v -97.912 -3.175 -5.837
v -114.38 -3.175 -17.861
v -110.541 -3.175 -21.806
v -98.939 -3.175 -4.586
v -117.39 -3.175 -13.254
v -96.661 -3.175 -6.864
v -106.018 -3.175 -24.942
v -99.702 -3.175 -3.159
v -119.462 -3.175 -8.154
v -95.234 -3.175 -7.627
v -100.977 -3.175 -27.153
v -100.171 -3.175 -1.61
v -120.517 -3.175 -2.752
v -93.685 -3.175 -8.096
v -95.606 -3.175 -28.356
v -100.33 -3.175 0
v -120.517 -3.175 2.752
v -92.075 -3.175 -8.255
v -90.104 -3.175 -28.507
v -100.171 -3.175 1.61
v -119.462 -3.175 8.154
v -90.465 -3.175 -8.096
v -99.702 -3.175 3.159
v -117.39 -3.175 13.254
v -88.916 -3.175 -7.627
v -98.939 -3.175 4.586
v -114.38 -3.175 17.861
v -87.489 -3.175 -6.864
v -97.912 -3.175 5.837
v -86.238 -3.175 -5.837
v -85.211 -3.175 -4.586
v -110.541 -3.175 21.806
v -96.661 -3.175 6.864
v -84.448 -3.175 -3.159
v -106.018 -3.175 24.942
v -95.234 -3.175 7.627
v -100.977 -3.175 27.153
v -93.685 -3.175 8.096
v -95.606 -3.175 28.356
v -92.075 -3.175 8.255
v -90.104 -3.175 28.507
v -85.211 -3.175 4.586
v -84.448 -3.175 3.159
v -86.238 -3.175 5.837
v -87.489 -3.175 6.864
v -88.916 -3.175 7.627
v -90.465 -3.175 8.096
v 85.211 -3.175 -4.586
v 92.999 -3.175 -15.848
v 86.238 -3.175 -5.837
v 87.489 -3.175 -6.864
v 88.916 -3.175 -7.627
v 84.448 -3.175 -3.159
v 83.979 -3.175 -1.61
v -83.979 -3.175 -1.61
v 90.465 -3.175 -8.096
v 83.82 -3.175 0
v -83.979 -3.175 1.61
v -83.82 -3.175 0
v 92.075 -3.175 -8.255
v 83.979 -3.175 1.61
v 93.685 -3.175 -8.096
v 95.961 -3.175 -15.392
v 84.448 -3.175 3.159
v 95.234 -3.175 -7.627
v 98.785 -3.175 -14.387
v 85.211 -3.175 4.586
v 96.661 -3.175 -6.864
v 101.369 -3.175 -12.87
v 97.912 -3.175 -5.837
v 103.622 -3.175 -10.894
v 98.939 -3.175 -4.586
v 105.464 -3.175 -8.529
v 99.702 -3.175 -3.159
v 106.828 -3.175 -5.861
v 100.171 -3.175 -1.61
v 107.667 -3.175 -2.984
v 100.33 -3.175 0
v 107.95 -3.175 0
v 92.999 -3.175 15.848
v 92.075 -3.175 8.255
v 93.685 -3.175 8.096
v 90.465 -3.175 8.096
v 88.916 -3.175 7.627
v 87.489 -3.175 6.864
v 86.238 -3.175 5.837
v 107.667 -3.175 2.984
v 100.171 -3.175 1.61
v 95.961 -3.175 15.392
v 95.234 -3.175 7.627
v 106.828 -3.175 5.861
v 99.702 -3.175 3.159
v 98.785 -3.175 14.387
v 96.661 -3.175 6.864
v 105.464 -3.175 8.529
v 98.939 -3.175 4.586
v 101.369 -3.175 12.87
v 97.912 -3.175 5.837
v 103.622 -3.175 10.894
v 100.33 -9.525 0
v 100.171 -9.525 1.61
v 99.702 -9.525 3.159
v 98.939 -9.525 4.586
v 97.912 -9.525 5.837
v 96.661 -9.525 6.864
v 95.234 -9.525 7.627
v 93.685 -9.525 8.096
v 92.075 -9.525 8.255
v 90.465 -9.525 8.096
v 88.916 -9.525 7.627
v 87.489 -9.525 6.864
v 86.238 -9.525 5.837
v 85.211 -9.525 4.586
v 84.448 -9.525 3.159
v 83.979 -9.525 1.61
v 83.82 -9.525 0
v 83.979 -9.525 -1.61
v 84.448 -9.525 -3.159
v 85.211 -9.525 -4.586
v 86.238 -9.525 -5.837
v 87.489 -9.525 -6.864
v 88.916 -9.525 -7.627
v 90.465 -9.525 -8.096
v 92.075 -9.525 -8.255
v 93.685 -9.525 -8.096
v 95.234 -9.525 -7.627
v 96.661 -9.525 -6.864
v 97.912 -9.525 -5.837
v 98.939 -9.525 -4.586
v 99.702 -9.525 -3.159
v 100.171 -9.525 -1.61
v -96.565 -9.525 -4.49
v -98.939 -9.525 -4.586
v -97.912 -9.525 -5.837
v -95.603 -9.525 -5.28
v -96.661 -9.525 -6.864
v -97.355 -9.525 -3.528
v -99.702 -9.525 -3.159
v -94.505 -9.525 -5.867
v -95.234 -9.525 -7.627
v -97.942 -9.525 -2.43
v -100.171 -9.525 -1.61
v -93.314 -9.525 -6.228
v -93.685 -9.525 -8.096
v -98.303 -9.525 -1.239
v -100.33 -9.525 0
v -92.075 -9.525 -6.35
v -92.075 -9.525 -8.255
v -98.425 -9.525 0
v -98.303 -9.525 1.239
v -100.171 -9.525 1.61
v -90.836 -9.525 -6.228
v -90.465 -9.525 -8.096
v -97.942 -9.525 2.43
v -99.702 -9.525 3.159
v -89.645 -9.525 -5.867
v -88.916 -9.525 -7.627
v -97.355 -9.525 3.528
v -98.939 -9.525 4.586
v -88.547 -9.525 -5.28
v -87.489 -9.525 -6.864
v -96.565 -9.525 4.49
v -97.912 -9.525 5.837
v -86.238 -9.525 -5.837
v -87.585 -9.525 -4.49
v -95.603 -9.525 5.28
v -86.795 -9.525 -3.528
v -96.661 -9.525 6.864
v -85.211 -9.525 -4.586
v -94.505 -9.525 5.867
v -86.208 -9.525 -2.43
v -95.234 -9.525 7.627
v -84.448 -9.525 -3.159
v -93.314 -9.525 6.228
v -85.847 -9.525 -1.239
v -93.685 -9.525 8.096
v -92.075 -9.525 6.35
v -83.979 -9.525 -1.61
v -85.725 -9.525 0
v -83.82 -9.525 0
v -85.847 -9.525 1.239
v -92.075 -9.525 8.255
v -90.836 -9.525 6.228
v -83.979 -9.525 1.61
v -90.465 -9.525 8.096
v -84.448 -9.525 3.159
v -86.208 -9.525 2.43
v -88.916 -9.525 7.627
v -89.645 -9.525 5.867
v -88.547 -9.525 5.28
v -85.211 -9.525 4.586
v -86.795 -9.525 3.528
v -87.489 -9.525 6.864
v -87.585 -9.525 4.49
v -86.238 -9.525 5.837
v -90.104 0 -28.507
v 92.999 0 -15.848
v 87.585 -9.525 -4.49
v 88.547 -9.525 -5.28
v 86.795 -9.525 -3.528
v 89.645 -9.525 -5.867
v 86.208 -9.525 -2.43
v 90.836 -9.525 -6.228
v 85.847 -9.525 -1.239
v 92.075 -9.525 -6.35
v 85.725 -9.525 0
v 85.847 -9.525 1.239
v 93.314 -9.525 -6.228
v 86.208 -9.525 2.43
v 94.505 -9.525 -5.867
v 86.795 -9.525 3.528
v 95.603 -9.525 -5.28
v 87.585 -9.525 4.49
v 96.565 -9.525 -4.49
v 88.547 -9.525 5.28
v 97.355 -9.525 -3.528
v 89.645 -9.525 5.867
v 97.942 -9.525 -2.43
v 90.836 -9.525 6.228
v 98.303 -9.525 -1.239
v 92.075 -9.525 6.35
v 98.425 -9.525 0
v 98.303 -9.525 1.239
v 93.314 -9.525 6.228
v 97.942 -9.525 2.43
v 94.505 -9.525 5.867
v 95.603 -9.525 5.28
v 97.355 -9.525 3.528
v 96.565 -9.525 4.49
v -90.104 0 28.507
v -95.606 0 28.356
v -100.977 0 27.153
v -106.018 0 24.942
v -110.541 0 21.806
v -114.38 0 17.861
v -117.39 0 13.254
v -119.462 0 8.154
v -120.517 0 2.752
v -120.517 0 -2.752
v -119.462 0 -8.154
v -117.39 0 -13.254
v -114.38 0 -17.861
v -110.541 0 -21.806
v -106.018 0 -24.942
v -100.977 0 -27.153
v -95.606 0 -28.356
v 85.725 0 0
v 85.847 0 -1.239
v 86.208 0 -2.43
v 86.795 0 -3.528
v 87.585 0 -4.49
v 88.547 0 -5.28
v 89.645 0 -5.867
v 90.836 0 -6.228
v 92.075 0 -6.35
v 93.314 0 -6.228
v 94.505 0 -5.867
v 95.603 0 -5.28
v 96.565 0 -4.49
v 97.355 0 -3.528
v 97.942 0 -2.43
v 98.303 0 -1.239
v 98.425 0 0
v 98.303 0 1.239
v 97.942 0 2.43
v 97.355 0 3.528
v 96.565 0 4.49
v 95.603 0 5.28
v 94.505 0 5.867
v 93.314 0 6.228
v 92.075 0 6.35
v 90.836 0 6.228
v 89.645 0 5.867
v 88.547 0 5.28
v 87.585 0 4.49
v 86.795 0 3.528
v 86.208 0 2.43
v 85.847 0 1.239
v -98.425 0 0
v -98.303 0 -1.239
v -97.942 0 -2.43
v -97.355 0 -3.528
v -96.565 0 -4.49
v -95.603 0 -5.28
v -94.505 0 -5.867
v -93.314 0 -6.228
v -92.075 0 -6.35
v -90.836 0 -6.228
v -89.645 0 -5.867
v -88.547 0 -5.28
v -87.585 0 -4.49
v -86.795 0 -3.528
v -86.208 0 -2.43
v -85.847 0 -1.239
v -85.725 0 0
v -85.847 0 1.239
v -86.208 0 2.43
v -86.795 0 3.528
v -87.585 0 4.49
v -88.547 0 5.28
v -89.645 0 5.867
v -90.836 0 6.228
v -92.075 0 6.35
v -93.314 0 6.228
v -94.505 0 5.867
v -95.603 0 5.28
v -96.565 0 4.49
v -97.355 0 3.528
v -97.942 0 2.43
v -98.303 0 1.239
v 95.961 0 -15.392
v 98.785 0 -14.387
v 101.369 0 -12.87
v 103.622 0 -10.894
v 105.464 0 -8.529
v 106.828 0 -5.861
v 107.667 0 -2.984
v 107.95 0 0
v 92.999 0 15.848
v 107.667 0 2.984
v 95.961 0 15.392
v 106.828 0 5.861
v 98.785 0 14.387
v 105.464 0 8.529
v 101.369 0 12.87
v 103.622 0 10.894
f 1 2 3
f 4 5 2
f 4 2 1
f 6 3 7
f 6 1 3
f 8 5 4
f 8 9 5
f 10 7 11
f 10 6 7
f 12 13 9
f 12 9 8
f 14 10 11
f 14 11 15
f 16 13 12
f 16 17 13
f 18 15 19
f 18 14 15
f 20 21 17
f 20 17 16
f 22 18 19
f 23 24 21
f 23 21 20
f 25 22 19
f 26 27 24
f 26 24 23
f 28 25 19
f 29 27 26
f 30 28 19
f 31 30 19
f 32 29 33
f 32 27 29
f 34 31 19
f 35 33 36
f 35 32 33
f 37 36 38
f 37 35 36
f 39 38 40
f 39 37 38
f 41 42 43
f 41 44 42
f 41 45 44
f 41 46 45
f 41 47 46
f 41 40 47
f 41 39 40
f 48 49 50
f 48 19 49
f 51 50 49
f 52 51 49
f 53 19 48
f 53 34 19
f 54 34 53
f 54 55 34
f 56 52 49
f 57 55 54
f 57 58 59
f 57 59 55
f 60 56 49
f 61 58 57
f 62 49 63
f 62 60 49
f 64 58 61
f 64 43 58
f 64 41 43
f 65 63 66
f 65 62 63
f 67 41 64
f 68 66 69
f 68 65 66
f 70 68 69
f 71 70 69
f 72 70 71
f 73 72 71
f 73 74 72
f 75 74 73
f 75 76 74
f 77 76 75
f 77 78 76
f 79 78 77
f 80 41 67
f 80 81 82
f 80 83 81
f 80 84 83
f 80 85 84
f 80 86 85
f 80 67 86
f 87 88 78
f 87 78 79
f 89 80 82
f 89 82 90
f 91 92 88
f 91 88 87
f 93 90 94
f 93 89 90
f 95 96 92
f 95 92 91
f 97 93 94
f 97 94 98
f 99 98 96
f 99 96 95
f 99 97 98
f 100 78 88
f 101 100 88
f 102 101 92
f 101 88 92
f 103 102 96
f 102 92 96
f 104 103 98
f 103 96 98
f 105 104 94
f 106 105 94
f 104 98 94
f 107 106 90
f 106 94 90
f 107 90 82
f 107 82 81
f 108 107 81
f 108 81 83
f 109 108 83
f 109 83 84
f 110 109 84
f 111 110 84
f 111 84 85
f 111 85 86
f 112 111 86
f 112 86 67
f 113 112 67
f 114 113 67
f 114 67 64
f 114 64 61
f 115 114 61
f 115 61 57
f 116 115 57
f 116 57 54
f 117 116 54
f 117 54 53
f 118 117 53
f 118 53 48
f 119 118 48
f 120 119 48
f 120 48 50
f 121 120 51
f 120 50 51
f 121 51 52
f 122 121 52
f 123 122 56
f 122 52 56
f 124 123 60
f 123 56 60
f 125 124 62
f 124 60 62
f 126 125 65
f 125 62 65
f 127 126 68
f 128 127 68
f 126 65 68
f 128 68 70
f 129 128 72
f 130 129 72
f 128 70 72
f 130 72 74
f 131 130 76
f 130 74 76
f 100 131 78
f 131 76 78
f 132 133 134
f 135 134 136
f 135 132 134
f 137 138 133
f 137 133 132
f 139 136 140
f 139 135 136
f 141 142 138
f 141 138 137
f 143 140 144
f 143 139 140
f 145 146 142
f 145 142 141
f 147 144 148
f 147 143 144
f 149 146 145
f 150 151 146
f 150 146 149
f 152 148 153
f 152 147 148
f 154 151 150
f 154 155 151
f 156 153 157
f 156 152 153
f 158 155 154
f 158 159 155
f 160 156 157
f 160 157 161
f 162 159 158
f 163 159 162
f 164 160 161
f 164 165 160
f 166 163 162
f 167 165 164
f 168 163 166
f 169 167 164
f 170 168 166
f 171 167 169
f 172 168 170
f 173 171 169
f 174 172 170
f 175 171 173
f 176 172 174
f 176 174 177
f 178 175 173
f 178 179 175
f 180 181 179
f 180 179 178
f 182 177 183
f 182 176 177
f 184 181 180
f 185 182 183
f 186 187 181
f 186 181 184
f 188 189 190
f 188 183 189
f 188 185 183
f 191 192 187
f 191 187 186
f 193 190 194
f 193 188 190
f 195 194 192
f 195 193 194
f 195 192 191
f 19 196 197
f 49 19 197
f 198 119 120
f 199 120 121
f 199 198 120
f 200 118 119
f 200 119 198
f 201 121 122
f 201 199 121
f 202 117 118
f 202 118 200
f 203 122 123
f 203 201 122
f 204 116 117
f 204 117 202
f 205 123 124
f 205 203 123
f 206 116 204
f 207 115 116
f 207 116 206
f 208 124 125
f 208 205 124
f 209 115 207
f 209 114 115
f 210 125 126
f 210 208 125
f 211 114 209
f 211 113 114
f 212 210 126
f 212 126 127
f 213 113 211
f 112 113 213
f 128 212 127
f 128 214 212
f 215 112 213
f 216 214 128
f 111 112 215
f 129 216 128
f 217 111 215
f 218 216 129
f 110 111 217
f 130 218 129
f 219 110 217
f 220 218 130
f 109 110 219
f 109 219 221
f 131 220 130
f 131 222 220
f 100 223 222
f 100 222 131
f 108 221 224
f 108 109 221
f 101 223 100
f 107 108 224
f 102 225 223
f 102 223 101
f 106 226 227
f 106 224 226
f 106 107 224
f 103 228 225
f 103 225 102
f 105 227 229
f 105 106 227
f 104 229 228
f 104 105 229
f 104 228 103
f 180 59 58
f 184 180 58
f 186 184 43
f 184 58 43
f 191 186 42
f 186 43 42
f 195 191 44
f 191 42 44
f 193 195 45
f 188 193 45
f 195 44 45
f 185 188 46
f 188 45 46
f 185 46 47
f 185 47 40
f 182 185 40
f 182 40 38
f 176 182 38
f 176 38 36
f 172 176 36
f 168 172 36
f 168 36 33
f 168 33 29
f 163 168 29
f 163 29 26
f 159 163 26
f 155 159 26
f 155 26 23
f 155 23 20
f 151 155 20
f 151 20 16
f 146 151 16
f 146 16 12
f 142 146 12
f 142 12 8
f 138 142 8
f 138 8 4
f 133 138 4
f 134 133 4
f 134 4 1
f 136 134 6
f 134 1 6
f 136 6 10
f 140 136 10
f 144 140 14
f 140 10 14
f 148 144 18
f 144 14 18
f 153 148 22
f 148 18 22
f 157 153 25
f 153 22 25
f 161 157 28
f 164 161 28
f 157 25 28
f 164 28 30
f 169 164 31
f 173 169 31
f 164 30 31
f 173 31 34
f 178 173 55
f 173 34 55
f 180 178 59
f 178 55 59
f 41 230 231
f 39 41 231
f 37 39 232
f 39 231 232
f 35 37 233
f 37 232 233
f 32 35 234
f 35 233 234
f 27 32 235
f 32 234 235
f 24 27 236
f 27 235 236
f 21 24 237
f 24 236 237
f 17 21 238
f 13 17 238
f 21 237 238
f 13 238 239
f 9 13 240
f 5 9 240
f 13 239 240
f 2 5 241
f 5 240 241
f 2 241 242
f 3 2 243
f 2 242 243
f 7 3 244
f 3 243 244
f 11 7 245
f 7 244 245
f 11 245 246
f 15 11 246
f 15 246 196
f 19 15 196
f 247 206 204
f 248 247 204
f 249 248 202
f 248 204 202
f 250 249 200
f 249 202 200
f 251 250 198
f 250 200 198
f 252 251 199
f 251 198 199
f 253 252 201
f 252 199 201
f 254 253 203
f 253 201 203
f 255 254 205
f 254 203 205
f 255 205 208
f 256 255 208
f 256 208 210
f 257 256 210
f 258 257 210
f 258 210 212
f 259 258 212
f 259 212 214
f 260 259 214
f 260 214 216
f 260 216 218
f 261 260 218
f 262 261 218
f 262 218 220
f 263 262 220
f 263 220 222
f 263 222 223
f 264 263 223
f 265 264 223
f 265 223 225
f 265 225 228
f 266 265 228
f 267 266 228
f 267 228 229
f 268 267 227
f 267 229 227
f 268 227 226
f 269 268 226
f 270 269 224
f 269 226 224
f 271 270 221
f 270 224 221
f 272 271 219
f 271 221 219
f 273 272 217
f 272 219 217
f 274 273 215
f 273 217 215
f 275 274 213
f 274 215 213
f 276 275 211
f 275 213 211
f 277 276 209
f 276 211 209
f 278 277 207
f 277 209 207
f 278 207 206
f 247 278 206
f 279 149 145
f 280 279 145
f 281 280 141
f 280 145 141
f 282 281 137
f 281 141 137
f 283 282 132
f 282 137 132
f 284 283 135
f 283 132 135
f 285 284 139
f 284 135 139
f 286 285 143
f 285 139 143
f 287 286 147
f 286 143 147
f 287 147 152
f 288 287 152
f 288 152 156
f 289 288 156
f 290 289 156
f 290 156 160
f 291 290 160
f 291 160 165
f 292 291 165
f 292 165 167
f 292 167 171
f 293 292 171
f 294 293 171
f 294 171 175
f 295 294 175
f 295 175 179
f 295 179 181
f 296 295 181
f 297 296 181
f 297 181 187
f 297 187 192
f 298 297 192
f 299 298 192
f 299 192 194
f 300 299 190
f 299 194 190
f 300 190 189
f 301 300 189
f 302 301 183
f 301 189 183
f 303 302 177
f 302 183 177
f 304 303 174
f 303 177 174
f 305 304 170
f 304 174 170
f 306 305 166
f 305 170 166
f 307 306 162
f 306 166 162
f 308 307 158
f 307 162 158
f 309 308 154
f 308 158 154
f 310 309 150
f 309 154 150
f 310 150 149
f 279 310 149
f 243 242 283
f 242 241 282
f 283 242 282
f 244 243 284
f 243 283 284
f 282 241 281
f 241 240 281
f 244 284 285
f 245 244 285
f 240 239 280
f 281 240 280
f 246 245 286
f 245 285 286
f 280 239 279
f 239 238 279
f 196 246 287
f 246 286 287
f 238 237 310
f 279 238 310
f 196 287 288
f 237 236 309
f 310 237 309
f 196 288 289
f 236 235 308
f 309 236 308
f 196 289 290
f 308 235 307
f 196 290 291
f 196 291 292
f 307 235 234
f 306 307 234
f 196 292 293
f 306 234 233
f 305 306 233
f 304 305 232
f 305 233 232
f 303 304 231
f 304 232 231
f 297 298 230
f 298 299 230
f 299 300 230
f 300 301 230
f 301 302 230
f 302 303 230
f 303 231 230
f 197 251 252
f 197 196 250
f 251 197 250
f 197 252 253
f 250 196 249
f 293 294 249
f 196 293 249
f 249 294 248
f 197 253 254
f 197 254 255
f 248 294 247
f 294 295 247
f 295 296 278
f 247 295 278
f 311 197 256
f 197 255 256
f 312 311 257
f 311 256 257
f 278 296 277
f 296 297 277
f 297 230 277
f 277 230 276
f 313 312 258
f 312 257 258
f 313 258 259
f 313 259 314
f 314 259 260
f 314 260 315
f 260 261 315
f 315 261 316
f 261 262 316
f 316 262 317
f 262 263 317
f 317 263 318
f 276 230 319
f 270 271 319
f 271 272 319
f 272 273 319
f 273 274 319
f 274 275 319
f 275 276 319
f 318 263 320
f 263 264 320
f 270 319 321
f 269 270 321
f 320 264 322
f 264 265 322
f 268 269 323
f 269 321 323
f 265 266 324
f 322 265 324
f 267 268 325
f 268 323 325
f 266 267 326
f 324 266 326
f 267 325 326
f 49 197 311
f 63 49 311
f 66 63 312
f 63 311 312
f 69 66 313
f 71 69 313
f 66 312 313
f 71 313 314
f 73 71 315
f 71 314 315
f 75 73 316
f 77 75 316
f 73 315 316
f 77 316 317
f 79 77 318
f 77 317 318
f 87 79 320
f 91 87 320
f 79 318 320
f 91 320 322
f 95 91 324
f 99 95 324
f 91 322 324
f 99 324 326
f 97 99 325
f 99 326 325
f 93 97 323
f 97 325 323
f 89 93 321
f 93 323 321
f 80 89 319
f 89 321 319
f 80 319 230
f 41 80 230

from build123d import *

# Parameters (mm, degrees)
F0_R     = 8.255
F1_DEPTH = 3.175
F2_DEPTH = 9.525
F3_D     = 12.7


with BuildPart() as f1:
    # F0 (on Front) → F1 (new body)
    with BuildSketch(Plane.XZ):
        with BuildLine():
            Line((92.999168, 15.848077), (-90.104167, 28.506954))
            ThreePointArc((-90.104167, 28.506954), (-120.65, 0), (-90.104167, -28.506954))
            Line((-90.104167, -28.506954), (92.999168, -15.848077))
            ThreePointArc((92.999168, -15.848077), (107.95, 0), (92.999168, 15.848077))
        make_face()
        with Locations((-92.075, 0)):
            Circle(F0_R, mode=Mode.SUBTRACT)
        with Locations((92.075, 0)):
            Circle(F0_R, mode=Mode.SUBTRACT)
    extrude(amount=F1_DEPTH)

    # F0 (on Front) → F2 (join)
    with BuildSketch(Plane.XZ):
        with Locations((-92.075, 0)):
            Circle(F0_R)
        with Locations((92.075, 0)):
            Circle(F0_R)
    extrude(amount=F2_DEPTH)

    # F3 (through all)
    with Locations(Plane(origin=(0, 0, 0), x_dir=(1, 0, 0), z_dir=(0, 1, 0))):
        with Locations((-92.075, 0), (92.075, 0)):
            Hole(F3_D / 2)


solid = f1.part
